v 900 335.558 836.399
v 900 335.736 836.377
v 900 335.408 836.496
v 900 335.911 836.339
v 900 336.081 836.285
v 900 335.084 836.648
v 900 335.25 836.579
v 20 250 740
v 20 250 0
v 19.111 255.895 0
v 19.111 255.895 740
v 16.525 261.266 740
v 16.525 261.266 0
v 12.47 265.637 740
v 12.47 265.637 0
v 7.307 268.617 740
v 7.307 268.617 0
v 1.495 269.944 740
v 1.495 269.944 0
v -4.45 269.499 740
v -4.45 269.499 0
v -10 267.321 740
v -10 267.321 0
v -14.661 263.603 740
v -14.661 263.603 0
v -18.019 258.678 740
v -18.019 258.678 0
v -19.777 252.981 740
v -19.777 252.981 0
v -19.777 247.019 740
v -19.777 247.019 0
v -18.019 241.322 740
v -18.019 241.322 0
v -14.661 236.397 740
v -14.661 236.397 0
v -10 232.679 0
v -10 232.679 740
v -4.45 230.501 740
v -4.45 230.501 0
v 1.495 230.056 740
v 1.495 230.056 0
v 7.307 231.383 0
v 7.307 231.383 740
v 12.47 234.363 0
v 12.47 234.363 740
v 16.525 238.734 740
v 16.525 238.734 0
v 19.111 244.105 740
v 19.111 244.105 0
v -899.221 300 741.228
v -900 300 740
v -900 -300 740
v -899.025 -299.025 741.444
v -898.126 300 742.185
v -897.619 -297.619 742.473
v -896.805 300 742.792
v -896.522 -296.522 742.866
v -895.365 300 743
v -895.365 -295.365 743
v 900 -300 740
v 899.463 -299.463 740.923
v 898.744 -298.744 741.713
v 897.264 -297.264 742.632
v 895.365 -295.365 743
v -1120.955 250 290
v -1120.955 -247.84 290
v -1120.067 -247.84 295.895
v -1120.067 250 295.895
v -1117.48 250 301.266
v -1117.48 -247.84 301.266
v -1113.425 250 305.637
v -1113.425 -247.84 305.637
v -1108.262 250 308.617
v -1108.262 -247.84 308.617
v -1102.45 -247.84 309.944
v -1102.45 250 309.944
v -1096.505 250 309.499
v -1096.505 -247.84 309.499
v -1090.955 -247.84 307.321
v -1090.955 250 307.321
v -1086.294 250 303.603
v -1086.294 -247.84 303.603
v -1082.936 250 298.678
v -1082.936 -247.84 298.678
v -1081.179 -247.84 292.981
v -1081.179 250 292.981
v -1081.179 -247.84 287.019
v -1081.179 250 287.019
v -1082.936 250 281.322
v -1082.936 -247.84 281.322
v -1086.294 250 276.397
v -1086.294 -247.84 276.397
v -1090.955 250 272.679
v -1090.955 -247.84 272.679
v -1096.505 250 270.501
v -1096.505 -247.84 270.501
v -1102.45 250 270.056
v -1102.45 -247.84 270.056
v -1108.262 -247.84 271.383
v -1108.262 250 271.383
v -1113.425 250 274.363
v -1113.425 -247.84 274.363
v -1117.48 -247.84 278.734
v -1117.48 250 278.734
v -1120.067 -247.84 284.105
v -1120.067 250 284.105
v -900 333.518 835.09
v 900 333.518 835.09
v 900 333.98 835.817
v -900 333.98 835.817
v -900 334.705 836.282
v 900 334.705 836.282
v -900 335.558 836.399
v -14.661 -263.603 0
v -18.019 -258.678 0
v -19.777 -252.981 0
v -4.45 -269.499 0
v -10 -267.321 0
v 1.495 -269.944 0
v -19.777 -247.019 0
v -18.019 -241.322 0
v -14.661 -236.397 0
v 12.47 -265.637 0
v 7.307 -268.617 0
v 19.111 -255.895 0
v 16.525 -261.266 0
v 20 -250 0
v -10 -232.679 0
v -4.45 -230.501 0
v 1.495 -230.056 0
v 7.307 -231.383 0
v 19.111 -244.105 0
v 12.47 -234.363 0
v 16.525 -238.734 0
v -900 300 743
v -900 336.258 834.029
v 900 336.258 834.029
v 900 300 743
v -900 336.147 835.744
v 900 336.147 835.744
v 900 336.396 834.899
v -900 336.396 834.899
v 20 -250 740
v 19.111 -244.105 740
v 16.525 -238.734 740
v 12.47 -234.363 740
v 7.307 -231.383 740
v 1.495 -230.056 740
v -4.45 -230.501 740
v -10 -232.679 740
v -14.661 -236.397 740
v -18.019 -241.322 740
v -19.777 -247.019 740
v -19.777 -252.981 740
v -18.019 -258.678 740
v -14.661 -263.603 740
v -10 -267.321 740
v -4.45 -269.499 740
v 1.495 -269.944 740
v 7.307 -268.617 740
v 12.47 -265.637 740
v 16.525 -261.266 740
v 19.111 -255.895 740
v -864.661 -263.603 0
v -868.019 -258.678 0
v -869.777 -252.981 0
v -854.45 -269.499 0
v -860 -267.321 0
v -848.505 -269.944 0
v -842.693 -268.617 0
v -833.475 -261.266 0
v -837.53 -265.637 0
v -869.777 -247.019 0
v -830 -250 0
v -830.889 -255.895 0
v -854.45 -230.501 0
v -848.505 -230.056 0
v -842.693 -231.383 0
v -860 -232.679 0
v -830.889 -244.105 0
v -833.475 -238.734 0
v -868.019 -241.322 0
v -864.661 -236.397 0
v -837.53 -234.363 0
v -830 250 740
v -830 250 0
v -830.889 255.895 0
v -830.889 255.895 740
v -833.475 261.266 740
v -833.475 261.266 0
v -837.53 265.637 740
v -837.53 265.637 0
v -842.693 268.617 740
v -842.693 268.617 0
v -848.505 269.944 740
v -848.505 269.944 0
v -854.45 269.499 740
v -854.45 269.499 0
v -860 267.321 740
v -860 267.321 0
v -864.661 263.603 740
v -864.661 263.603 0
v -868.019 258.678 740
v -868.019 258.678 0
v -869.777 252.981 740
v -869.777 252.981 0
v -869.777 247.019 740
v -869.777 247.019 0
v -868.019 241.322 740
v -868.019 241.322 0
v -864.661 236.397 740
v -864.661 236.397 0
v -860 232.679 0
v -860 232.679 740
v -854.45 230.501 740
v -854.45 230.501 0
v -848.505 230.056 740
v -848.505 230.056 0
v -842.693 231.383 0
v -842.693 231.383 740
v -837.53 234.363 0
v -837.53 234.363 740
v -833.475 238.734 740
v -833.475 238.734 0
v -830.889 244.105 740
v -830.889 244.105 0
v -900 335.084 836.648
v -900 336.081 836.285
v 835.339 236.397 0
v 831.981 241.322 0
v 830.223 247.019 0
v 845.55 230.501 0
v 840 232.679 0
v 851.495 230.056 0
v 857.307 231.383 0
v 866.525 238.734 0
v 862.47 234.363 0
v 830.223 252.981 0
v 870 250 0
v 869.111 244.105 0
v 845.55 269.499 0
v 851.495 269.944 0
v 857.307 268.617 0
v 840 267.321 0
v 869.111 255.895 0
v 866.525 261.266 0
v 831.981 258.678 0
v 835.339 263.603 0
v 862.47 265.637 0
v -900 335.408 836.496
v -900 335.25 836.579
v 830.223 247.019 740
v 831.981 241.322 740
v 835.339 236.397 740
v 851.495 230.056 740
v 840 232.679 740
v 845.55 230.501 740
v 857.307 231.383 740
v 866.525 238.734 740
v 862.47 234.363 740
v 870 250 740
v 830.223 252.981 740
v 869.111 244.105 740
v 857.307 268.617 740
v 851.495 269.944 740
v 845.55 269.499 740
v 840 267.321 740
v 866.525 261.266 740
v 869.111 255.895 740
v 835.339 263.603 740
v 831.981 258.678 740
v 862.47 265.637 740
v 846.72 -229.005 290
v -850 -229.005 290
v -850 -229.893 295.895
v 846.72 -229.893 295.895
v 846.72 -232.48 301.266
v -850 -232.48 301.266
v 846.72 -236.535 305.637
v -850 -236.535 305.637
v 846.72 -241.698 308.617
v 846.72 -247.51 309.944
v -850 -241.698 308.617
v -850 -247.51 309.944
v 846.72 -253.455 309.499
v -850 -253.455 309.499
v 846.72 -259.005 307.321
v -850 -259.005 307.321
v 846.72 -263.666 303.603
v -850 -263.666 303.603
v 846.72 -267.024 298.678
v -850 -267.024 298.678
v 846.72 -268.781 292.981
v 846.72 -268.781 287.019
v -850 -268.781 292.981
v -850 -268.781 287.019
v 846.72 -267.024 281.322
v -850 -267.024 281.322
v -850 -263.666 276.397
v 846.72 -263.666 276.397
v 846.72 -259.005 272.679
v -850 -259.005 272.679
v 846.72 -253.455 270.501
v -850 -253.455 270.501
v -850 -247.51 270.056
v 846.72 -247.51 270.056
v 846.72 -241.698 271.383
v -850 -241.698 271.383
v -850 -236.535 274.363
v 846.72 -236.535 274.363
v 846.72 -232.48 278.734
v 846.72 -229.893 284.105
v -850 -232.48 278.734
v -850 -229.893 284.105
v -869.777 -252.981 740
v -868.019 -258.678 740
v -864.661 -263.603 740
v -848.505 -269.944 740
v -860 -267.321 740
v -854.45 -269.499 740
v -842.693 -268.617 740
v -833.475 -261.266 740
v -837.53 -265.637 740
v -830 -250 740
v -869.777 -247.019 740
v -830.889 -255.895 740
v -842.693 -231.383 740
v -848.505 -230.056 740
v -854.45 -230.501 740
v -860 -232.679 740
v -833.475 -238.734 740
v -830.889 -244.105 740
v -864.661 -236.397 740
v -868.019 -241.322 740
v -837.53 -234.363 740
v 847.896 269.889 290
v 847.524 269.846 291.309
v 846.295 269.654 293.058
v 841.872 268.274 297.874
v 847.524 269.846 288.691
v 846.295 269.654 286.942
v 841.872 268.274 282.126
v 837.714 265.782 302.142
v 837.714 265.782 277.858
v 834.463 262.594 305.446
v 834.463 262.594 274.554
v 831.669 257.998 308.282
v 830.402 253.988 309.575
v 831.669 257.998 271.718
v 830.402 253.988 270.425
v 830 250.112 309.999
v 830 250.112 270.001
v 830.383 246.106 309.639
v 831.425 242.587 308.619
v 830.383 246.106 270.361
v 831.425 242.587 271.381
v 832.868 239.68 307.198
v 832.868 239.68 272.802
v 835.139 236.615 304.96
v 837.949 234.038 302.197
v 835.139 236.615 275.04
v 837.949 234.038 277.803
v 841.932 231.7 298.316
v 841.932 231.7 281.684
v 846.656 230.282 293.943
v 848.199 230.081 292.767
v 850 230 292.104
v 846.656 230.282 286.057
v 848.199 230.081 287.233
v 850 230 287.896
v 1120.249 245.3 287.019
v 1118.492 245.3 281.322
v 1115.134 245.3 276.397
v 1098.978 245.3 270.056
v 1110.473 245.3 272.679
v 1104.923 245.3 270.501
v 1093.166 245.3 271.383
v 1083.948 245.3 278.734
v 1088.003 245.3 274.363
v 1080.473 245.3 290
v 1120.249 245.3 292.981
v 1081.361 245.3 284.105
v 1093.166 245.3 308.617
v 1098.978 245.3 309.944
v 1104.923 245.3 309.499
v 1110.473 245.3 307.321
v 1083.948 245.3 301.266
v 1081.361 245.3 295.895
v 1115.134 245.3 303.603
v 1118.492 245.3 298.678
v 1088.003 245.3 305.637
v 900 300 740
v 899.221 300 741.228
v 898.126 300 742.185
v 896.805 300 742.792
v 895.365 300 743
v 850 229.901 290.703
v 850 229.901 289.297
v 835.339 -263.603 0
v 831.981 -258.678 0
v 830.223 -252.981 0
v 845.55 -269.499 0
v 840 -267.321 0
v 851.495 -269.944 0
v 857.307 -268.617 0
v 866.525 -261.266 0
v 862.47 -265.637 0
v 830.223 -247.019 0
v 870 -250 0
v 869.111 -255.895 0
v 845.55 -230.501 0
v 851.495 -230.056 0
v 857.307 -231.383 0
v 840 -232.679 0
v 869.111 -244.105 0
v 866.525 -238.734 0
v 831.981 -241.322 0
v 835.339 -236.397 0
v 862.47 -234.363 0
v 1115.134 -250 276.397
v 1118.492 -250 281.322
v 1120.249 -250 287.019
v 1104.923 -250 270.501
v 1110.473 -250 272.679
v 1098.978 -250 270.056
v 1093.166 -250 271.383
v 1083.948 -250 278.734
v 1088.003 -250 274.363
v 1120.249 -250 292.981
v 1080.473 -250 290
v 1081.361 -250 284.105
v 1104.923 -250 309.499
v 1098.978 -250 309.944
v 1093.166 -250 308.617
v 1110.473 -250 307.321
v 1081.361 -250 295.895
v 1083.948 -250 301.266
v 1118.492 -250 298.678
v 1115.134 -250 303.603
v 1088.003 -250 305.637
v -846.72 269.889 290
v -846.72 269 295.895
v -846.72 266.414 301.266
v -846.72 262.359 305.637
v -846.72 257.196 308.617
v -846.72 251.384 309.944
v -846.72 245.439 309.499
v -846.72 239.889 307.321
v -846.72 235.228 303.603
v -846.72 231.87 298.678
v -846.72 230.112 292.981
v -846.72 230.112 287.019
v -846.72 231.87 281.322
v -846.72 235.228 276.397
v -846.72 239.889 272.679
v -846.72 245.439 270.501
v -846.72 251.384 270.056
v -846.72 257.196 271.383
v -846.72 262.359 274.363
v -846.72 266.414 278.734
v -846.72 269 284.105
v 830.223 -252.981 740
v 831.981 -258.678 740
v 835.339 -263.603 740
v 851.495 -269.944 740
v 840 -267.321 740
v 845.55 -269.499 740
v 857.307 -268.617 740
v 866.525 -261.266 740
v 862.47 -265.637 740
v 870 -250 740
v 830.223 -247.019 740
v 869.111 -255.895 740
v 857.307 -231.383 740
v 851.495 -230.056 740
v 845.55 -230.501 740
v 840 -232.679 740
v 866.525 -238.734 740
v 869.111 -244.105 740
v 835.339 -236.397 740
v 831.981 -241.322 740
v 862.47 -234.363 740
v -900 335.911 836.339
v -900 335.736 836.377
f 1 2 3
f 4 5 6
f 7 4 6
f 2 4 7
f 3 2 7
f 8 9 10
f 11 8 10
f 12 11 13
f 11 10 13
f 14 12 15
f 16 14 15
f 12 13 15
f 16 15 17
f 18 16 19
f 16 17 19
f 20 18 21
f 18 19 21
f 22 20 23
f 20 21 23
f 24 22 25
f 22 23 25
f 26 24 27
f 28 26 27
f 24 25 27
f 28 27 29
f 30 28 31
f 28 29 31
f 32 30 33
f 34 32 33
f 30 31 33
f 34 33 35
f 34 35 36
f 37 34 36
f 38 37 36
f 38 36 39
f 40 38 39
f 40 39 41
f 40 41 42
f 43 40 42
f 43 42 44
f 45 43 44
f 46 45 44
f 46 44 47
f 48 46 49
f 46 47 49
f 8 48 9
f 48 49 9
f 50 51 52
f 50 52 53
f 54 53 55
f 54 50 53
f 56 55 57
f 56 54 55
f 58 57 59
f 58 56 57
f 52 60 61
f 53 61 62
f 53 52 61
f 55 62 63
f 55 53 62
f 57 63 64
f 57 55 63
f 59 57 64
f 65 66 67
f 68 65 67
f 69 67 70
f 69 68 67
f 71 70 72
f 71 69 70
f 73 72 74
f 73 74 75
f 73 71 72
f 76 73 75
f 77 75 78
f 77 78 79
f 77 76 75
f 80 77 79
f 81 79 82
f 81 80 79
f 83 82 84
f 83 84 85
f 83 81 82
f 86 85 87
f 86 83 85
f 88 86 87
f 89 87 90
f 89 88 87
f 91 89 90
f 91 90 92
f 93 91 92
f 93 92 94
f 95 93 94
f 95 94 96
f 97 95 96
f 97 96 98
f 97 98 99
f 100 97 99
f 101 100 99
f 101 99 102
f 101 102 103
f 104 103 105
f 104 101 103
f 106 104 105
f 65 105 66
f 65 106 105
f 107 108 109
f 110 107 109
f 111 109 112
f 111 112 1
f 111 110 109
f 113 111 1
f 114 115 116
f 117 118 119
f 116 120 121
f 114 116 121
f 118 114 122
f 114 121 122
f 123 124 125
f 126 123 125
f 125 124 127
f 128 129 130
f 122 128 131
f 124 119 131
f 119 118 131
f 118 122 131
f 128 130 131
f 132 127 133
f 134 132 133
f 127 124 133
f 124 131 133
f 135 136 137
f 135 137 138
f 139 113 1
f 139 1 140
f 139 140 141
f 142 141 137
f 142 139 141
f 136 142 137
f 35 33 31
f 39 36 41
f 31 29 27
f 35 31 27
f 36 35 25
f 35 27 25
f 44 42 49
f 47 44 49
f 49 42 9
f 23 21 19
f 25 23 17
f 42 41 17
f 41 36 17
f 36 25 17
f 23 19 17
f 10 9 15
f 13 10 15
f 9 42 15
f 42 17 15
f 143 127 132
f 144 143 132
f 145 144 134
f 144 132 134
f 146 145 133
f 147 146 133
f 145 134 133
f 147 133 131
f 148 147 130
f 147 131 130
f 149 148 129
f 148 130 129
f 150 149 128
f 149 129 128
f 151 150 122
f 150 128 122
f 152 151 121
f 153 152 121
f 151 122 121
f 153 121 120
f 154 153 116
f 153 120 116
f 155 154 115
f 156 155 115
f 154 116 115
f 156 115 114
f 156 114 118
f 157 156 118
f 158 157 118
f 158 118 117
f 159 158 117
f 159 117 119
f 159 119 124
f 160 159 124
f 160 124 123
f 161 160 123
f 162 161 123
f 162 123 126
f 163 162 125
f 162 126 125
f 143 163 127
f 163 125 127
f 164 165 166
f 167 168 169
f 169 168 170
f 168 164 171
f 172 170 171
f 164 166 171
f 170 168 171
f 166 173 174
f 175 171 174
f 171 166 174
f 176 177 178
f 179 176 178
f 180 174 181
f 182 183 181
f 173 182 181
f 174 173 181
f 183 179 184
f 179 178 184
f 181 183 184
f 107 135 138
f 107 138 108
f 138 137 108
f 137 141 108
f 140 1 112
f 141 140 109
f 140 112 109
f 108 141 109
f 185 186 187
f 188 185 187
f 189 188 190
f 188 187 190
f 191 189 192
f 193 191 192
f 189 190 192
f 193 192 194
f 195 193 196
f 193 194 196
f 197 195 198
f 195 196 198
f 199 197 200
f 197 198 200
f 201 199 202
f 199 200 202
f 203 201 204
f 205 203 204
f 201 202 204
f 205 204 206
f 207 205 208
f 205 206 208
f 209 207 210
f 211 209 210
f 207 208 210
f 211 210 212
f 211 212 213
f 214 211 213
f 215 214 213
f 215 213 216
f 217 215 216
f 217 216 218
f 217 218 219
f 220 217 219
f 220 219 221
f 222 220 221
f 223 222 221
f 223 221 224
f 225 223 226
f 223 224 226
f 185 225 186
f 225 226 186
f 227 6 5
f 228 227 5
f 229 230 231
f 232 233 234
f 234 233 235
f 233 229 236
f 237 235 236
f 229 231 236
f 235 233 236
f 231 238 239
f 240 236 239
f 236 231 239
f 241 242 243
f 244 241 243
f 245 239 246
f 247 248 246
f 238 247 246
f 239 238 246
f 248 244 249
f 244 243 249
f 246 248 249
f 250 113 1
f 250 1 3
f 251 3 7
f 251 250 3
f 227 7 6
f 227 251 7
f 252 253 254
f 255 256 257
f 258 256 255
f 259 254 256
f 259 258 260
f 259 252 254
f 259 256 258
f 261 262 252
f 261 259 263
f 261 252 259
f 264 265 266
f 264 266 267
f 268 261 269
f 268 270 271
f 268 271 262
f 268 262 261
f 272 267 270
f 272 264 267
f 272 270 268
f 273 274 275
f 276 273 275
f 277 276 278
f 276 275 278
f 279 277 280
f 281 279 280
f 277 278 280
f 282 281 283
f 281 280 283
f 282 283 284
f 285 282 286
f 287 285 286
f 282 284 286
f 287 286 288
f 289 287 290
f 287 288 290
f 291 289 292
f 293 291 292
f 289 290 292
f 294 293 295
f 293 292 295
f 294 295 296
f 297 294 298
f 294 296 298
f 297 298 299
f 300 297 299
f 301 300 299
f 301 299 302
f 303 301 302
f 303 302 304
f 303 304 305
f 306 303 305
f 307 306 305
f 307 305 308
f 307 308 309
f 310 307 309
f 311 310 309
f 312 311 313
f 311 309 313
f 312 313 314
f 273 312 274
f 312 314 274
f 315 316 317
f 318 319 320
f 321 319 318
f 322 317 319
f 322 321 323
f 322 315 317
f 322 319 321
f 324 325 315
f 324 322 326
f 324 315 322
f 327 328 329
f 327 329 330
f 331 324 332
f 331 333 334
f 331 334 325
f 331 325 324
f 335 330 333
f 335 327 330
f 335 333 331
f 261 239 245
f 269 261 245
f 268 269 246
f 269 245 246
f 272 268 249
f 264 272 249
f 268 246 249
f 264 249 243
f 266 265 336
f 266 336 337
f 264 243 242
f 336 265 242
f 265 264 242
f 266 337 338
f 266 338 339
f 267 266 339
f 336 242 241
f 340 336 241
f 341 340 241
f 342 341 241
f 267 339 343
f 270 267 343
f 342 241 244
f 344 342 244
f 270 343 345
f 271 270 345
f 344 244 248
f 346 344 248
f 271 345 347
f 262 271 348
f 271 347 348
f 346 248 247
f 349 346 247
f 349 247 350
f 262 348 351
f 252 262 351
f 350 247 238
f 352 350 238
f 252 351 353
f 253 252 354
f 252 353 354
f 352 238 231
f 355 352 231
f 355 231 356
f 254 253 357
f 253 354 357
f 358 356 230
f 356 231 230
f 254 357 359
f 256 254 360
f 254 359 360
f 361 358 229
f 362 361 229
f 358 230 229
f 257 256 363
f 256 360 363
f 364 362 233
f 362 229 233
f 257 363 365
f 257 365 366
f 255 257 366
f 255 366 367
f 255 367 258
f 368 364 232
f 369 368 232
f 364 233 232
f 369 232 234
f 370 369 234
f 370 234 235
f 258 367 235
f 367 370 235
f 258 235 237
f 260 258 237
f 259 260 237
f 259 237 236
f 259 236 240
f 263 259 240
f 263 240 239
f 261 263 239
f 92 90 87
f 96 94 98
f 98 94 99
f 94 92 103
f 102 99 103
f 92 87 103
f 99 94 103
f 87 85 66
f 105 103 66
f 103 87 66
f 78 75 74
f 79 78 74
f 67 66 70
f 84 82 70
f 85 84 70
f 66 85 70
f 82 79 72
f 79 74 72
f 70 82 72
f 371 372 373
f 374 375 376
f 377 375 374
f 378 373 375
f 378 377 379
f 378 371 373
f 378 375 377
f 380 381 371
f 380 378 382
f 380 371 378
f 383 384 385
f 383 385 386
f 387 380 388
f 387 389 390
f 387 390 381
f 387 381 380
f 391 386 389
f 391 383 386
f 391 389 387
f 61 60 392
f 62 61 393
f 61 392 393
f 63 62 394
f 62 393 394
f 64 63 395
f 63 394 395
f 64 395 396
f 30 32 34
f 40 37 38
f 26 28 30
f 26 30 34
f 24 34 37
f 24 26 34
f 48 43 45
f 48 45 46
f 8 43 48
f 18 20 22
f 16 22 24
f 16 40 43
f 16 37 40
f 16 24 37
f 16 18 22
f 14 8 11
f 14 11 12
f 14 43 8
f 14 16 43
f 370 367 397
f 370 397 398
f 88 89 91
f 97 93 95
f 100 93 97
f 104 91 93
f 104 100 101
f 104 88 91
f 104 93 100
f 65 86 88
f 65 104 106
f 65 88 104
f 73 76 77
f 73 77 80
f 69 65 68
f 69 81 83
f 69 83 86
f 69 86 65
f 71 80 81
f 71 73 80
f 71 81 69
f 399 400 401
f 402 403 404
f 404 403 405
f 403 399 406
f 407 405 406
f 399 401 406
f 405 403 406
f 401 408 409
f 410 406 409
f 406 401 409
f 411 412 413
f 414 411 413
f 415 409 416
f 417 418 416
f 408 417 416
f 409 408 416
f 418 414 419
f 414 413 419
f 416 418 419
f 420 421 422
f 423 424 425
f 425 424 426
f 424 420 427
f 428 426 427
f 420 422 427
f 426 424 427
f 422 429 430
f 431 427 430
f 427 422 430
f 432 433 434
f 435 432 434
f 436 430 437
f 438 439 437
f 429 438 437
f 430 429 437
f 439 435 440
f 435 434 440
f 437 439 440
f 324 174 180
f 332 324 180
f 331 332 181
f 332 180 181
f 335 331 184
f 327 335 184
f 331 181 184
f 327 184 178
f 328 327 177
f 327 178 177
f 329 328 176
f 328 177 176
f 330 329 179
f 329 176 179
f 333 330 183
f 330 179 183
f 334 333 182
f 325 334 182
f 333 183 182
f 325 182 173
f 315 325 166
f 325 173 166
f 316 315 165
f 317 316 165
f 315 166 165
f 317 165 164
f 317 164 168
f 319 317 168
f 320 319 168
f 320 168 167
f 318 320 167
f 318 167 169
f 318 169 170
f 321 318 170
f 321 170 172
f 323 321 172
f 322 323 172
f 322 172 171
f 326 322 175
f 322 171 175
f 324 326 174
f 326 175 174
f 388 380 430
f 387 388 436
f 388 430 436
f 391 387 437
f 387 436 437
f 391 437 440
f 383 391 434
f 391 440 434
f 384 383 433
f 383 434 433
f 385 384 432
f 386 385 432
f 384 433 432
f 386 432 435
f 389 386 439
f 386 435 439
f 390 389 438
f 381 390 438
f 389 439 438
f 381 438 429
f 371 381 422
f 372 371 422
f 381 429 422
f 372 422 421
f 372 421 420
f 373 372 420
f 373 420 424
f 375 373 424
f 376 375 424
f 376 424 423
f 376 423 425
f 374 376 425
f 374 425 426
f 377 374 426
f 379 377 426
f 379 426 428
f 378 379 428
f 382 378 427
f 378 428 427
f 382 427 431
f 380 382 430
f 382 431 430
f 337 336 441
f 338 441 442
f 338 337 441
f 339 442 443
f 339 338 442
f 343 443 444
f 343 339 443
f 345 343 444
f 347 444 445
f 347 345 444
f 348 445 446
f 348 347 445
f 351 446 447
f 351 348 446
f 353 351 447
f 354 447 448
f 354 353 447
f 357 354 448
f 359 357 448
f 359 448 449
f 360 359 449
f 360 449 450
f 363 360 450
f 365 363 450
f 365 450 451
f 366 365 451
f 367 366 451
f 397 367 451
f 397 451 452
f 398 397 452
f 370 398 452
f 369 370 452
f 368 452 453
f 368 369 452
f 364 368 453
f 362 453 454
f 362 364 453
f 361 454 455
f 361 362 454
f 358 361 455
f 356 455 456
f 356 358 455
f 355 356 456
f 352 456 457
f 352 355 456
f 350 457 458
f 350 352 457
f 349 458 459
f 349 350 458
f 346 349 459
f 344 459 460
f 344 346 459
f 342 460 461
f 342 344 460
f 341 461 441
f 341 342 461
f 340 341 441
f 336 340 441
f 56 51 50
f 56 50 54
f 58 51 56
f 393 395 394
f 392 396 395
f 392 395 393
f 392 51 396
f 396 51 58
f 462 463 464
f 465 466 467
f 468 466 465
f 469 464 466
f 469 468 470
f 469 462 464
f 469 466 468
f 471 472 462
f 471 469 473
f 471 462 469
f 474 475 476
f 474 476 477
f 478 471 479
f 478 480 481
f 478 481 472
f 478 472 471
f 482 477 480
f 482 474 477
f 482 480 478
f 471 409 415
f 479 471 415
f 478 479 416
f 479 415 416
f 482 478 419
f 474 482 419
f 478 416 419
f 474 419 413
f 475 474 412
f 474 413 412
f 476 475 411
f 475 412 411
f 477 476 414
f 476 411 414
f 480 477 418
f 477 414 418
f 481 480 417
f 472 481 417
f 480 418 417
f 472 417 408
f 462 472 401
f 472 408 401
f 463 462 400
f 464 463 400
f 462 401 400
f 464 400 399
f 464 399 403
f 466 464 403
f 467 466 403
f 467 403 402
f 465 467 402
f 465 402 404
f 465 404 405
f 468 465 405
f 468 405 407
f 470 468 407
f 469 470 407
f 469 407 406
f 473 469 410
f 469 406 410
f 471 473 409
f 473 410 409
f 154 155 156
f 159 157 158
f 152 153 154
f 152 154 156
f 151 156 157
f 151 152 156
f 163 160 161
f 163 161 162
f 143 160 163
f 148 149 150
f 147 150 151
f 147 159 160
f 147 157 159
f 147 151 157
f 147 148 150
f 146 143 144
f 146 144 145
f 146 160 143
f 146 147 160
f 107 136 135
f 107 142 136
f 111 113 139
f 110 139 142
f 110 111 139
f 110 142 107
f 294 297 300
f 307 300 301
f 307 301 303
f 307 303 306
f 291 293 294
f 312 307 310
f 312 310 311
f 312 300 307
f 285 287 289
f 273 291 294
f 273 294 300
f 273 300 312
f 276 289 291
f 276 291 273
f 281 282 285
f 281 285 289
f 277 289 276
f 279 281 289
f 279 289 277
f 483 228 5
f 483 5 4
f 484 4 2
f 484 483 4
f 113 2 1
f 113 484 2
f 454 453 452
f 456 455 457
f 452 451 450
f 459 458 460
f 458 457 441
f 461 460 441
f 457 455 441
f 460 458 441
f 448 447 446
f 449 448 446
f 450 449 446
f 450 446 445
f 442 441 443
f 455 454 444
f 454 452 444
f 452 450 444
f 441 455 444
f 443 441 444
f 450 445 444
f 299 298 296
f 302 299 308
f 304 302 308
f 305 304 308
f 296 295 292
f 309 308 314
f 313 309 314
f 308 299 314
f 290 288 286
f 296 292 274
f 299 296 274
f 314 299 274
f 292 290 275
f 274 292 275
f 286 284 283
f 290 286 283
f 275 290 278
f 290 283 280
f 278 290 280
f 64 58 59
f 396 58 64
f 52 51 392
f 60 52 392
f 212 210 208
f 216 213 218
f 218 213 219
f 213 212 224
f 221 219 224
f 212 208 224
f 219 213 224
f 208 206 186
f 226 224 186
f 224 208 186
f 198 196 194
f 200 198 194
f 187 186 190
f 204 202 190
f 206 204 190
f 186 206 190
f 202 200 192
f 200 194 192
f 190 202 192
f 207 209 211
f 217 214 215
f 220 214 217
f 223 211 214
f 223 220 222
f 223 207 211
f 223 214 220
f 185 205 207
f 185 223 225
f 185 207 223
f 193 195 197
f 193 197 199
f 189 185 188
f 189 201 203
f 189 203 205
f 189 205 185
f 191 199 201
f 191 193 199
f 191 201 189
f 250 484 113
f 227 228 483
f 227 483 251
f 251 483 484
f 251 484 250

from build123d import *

# Parameters (mm, degrees)
F0_R        = 20
F1_DEPTH    = 740
F2_W        = 1800
F2_H        = 600
F3_DEPTH    = 3
F5_DEPTH    = 1800
F6_T1_DEPTH = 623.1732604525
F6_T3_DEPTH = 1823.1732604525
F8_R        = 20
F9_DEPTH    = 1696.72
F11_R       = 20
F12_DEPTH   = 495.3
F14_R       = 20
F15_DEPTH   = 1696.72
F17_R       = 20
F18_DEPTH   = 497.84


# Not quite as in the source:
# - a fillet or chamfer that OpenCascade refuses, or shapes differently, is made with other operations: its cross-section is extruded or revolved along the edge and cut away or added


with BuildPart() as f1:
    # F0 (on Top) → F1 (new body)
    with BuildSketch(Plane.XY):
        with Locations((-850, 250)):
            Circle(F0_R)
    extrude(amount=F1_DEPTH)


with BuildPart() as f1b:
    # F0 (on Top) → F1, piece 2 (new body)
    with BuildSketch(Plane.XY):
        with Locations((-850, -250)):
            Circle(F0_R)
    extrude(amount=F1_DEPTH)


with BuildPart() as f1c:
    # F0 (on Top) → F1, piece 3 (new body)
    with BuildSketch(Plane.XY):
        with Locations((850, 250)):
            Circle(F0_R)
    extrude(amount=F1_DEPTH)

    # F14 (on face) → F15 (join)
    with BuildSketch(Plane.YZ.offset(850)):
        with Locations((249.8890012503, 290)):
            Circle(F14_R)
    extrude(amount=-F15_DEPTH)


with BuildPart() as f1d:
    # F0 (on Top) → F1, piece 4 (new body)
    with BuildSketch(Plane.XY):
        with Locations((850, -250)):
            Circle(F0_R)
    extrude(amount=F1_DEPTH)


with BuildPart() as f1e:
    # F0 (on Top) → F1, piece 5 (new body)
    with BuildSketch(Plane.XY):
        with Locations((0, 250)):
            Circle(F0_R)
    extrude(amount=F1_DEPTH)


with BuildPart() as f1f:
    # F0 (on Top) → F1, piece 6 (new body)
    with BuildSketch(Plane.XY):
        with Locations((0, -250)):
            Circle(F0_R)
    extrude(amount=F1_DEPTH)


with BuildPart() as f3:
    # F2 (on face) → F3 (new body)
    with BuildSketch(Plane.XY.offset(740)):
        Rectangle(F2_W, F2_H)
    extrude(amount=F3_DEPTH)

    # F6: fillet of radius 5.08 on 3 edges, made by hand

    # F6_s2 → F6_t1 (cut)
    with BuildSketch(Plane.XZ.offset(-311.5866302263)):
        with BuildLine():
            ThreePointArc((900, 740), (898.1257826579, 742.1845515591), (895.3653479095, 743))
            Line((895.3653479095, 743), (900, 743))
            Line((900, 743), (900, 740))
        make_face()
        with BuildLine():
            ThreePointArc((-900, 740), (-898.1257826579, 742.1845515591), (-895.3653479095, 743))
            Line((-895.3653479095, 743), (-900, 743))
            Line((-900, 743), (-900, 740))
        make_face()
    extrude(amount=F6_T1_DEPTH, mode=Mode.SUBTRACT)

    # F6_s4 → F6_t3 (cut)
    with BuildSketch(Plane.YZ.offset(-911.5866302263)):
        with BuildLine():
            ThreePointArc((-300, 740), (-298.1257826579, 742.1845515591), (-295.3653479095, 743))
            Line((-295.3653479095, 743), (-300, 743))
            Line((-300, 743), (-300, 740))
        make_face()
    extrude(amount=F6_T3_DEPTH, mode=Mode.SUBTRACT)


with BuildPart() as f5:
    # F4 (on face) → F5 (new body, through all)
    with BuildSketch(Plane(origin=(-900, 0, 0), x_dir=(0, -1, 0), z_dir=(-1, 0, 0))):
        with BuildLine():
            Line((-336.2584676847, 834.0285967724), (-300, 743))
            Line((-300, 743), (-333.5179740459, 835.089876837))
            ThreePointArc((-333.5179740459, 835.089876837), (-334.3171677089, 836.089043654), (-335.5584418841, 836.3993390954))
            ThreePointArc((-335.5584418841, 836.3993390954), (-336.3185674809, 835.3350648013), (-336.2584676847, 834.0285967724))
        make_face()
    extrude(amount=-F5_DEPTH)


with BuildPart() as f5b:
    # F4 (on face) → F5, piece 2 (new body, through all)
    with BuildSketch(Plane(origin=(-900, 0, 0), x_dir=(0, -1, 0), z_dir=(-1, 0, 0))):
        with BuildLine():
            ThreePointArc((-336.0813995741, 836.2852217919), (-335.8237556544, 836.3598544977), (-335.5584418841, 836.3993390954))
            ThreePointArc((-335.5584418841, 836.3993390954), (-335.3298195345, 836.5396325429), (-335.0844798629, 836.6480708928))
            Line((-335.0844798629, 836.6480708928), (-336.0813995741, 836.2852217919))
        make_face()
    extrude(amount=-F5_DEPTH)


with BuildPart() as f9:
    # F8 (on face) → F9 (new body)
    with BuildSketch(Plane.YZ.offset(-850)):
        with Locations((-249.004855752, 290)):
            Circle(F8_R)
    extrude(amount=F9_DEPTH)


with BuildPart() as f12:
    # F11 (on face) → F12 (new body)
    with BuildSketch(Plane(origin=(0, -250, 0), x_dir=(-1, 0, 0), z_dir=(0, 1, 0))):
        with Locations((-1100.4728078842, 290)):
            Circle(F11_R)
    extrude(amount=F12_DEPTH)


with BuildPart() as f18:
    # F17 (on face) → F18 (new body)
    with BuildSketch(Plane(origin=(0, 250, 0), x_dir=(-1, 0, 0), z_dir=(0, 1, 0))):
        with Locations((1100.9551286697, 290)):
            Circle(F17_R)
    extrude(amount=-F18_DEPTH)


solid = Compound([f1.part, f1b.part, f1c.part, f1d.part, f1e.part, f1f.part, f3.part, f5.part, f5b.part, f9.part, f12.part, f18.part])
